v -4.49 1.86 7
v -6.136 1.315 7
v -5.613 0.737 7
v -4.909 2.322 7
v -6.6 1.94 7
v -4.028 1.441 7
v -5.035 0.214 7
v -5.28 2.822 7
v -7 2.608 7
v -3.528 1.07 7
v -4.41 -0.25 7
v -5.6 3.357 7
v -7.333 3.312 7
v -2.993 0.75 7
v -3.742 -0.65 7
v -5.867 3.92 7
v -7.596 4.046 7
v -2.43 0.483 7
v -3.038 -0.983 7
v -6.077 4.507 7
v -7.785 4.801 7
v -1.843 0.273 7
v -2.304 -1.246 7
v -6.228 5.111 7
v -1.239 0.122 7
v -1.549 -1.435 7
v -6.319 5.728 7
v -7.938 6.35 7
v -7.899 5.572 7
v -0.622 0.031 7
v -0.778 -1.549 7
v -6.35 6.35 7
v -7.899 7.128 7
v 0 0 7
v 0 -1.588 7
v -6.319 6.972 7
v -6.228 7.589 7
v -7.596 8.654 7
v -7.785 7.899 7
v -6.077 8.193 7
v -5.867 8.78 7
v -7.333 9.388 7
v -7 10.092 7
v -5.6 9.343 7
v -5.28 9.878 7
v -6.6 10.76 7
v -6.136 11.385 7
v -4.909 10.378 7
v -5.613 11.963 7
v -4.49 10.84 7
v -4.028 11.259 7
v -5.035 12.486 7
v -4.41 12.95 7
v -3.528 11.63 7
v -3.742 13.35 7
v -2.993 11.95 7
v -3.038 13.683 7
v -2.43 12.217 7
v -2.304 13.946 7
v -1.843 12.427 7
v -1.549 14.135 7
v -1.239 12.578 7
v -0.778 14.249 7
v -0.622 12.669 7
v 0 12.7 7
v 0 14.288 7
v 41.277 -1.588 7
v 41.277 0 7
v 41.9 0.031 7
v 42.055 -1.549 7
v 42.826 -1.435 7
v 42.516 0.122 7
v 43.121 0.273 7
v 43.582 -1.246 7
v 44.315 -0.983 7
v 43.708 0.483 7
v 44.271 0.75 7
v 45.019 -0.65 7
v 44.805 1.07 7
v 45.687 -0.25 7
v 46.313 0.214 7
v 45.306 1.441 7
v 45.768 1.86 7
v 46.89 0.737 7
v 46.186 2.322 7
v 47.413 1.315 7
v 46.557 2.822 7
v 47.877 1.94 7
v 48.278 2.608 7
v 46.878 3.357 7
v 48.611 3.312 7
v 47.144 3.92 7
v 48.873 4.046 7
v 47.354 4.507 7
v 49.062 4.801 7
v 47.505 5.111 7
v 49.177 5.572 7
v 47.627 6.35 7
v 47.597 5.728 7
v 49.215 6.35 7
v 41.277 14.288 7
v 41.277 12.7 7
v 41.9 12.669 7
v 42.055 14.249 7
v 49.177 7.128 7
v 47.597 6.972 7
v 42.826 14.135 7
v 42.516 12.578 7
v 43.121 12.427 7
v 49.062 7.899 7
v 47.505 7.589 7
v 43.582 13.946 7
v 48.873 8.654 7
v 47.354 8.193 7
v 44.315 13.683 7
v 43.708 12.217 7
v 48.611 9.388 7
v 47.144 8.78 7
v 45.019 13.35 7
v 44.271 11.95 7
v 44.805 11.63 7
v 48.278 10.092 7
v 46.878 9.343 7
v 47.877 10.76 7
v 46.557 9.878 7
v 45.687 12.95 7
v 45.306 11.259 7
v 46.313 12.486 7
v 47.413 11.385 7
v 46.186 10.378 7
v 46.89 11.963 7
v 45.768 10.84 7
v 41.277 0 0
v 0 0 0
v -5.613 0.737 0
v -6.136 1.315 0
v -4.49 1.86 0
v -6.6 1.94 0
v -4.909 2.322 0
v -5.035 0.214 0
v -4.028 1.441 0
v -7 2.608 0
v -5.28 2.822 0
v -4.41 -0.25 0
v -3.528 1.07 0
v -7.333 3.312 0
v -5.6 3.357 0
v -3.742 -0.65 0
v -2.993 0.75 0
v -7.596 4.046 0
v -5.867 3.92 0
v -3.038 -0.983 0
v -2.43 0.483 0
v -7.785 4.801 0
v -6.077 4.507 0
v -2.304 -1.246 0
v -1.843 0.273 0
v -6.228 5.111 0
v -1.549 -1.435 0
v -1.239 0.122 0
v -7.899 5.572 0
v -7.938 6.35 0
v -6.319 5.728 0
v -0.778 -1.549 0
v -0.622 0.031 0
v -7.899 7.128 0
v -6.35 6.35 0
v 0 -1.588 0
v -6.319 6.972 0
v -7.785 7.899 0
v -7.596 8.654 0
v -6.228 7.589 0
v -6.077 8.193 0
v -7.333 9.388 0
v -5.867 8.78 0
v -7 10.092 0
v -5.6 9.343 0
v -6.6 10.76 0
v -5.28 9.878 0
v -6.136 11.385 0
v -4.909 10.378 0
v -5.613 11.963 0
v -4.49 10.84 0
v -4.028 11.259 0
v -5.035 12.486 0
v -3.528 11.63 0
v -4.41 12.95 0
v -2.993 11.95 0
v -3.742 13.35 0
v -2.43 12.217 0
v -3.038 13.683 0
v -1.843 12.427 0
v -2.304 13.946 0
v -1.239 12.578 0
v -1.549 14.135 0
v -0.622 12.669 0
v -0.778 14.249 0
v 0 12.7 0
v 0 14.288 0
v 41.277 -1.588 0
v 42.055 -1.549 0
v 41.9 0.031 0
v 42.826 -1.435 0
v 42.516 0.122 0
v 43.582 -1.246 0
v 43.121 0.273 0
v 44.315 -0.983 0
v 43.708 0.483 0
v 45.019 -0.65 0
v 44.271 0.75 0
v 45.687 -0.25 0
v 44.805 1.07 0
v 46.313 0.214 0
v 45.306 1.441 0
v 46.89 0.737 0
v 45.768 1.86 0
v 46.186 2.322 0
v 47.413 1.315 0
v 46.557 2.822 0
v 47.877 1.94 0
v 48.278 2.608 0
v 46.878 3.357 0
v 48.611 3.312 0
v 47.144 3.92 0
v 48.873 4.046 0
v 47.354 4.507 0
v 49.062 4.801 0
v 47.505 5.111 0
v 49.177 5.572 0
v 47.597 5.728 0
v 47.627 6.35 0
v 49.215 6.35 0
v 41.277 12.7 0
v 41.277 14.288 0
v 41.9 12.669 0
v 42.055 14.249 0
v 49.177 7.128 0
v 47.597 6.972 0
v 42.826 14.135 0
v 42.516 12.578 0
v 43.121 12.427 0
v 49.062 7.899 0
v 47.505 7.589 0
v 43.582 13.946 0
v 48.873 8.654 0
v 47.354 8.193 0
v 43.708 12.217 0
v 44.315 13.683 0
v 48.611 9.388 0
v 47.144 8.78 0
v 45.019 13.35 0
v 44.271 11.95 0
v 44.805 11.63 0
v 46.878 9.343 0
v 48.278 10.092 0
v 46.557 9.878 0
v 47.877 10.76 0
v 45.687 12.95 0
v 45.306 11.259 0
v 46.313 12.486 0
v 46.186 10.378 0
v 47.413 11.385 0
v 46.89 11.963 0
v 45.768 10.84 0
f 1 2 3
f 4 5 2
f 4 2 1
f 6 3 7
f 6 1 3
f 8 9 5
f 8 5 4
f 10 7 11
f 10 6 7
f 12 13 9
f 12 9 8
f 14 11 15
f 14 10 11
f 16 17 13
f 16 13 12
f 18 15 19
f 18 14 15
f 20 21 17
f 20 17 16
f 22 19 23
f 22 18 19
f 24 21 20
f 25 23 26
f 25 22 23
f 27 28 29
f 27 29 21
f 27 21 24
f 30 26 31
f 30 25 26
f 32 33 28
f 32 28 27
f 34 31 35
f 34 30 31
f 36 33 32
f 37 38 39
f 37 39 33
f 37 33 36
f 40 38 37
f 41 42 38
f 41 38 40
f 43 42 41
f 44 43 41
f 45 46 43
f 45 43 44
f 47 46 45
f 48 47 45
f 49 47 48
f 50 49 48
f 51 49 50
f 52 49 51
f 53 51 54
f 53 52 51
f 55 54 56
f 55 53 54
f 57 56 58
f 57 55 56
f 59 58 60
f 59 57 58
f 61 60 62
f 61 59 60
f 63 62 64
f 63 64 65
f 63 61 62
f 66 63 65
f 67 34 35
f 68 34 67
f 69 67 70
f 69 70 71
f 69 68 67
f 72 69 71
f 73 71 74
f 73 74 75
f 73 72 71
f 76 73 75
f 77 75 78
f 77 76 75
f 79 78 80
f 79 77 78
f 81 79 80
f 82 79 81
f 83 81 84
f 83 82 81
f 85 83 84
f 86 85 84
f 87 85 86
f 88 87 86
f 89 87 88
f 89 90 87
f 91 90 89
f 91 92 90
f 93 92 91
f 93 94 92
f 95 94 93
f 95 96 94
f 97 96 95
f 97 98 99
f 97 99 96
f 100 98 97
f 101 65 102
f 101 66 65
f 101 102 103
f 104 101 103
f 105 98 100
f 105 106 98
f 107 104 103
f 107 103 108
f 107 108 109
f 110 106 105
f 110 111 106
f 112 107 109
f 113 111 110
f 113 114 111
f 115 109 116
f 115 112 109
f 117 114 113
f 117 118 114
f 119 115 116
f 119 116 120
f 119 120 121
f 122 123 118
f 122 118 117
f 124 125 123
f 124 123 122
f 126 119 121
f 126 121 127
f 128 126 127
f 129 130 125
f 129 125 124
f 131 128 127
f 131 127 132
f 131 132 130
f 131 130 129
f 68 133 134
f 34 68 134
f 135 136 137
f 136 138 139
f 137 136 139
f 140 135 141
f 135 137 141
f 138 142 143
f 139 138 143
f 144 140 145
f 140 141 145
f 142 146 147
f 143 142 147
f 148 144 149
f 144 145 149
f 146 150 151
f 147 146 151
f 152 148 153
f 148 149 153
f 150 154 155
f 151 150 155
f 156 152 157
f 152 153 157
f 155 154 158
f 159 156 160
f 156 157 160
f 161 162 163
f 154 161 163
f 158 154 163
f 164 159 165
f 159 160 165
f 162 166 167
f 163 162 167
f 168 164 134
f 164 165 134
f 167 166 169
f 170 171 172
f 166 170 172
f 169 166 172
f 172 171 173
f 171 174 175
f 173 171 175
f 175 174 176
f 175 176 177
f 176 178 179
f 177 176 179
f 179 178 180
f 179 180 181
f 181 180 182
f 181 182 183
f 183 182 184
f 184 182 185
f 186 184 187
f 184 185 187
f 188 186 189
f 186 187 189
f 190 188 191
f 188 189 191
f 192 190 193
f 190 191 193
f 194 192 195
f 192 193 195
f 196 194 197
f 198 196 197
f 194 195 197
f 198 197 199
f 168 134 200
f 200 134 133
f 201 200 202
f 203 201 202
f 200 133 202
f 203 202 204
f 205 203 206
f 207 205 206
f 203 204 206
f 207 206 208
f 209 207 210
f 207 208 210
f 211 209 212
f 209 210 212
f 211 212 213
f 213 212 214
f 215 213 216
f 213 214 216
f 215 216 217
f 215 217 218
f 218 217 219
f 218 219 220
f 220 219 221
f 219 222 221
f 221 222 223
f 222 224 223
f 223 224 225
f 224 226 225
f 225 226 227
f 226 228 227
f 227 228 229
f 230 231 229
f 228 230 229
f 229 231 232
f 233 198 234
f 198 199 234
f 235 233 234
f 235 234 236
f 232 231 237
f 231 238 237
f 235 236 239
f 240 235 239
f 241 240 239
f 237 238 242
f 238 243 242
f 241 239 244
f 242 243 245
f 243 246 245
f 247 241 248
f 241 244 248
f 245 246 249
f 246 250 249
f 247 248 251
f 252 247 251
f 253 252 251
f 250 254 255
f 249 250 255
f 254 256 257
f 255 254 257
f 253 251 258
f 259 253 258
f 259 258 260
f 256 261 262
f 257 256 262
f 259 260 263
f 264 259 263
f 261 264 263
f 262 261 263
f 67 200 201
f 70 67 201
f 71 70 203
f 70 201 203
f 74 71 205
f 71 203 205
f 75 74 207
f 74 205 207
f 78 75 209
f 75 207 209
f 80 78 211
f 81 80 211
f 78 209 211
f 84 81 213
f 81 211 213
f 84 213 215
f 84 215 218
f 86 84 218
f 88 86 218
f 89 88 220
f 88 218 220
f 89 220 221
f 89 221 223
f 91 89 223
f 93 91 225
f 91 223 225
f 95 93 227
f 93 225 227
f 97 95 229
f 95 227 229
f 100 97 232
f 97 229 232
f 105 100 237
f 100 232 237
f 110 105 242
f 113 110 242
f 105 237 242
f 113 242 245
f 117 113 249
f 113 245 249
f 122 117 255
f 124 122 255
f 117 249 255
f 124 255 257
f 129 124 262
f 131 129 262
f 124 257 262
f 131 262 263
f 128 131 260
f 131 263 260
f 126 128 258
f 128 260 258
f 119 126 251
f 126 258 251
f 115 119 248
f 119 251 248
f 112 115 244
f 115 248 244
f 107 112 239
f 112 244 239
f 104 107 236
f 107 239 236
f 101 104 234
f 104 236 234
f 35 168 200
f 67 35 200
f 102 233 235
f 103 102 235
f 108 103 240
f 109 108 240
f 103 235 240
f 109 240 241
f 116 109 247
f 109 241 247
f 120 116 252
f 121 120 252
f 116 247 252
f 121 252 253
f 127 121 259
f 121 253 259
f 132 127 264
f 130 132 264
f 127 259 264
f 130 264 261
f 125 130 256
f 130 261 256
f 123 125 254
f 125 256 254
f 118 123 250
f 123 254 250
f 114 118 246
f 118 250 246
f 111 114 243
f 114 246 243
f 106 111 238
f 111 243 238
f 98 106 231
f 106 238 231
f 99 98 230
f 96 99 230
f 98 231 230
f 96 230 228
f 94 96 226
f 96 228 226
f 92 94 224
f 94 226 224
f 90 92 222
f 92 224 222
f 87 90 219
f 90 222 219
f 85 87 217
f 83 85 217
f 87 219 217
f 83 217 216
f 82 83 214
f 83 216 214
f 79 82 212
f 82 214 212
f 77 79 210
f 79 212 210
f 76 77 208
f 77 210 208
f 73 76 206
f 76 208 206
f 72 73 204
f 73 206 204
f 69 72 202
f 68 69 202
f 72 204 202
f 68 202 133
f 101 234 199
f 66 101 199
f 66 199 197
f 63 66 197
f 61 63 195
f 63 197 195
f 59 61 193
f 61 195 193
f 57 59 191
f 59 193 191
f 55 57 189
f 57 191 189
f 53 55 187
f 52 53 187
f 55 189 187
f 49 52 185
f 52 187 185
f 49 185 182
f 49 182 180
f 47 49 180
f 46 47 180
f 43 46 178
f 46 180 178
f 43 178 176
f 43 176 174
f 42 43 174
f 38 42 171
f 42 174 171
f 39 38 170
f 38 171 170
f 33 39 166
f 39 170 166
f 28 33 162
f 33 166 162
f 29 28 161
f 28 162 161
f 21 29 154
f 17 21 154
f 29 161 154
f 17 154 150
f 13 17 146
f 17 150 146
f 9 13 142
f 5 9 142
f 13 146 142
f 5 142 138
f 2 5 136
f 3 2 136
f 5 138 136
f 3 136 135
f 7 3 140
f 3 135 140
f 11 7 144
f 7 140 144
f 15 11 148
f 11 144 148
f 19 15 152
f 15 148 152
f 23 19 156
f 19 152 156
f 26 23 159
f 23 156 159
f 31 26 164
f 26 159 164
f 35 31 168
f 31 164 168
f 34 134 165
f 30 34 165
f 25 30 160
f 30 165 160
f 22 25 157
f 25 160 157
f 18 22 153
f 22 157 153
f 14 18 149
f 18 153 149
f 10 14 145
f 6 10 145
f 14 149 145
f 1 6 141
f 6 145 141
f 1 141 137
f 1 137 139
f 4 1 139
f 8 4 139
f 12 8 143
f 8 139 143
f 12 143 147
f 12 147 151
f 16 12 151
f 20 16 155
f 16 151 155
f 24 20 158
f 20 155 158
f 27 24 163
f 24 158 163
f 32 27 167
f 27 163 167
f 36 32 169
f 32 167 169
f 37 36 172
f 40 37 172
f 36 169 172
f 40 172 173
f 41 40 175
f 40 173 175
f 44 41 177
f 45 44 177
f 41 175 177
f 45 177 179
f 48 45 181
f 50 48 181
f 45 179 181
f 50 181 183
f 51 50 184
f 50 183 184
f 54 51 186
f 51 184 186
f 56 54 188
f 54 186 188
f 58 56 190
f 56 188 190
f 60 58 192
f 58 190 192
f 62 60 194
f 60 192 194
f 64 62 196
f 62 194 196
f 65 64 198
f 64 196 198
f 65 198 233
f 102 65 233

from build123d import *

# Parameters (mm, degrees)
F1_DEPTH = 7


with BuildPart() as f1:
    # F0 (on Top) → F1 (new body)
    with BuildSketch(Plane.XY):
        with BuildLine():
            Line((41.277483, 14.2875), (0, 14.2875))
            ThreePointArc((0, 14.2875), (-7.9375, 6.35), (0, -1.5875))
            Line((0, -1.5875), (41.277483, -1.5875))
            ThreePointArc((41.277483, -1.5875), (49.214983, 6.35), (41.277483, 14.2875))
        make_face()
        with BuildLine():
            Line((41.277483, 0), (0, 0))
            ThreePointArc((0, 0), (-6.35, 6.35), (0, 12.7))
            Line((0, 12.7), (41.277483, 12.7))
            ThreePointArc((41.277483, 12.7), (47.627483, 6.35), (41.277483, 0))
        make_face(mode=Mode.SUBTRACT)
    extrude(amount=F1_DEPTH)


solid = f1.part
